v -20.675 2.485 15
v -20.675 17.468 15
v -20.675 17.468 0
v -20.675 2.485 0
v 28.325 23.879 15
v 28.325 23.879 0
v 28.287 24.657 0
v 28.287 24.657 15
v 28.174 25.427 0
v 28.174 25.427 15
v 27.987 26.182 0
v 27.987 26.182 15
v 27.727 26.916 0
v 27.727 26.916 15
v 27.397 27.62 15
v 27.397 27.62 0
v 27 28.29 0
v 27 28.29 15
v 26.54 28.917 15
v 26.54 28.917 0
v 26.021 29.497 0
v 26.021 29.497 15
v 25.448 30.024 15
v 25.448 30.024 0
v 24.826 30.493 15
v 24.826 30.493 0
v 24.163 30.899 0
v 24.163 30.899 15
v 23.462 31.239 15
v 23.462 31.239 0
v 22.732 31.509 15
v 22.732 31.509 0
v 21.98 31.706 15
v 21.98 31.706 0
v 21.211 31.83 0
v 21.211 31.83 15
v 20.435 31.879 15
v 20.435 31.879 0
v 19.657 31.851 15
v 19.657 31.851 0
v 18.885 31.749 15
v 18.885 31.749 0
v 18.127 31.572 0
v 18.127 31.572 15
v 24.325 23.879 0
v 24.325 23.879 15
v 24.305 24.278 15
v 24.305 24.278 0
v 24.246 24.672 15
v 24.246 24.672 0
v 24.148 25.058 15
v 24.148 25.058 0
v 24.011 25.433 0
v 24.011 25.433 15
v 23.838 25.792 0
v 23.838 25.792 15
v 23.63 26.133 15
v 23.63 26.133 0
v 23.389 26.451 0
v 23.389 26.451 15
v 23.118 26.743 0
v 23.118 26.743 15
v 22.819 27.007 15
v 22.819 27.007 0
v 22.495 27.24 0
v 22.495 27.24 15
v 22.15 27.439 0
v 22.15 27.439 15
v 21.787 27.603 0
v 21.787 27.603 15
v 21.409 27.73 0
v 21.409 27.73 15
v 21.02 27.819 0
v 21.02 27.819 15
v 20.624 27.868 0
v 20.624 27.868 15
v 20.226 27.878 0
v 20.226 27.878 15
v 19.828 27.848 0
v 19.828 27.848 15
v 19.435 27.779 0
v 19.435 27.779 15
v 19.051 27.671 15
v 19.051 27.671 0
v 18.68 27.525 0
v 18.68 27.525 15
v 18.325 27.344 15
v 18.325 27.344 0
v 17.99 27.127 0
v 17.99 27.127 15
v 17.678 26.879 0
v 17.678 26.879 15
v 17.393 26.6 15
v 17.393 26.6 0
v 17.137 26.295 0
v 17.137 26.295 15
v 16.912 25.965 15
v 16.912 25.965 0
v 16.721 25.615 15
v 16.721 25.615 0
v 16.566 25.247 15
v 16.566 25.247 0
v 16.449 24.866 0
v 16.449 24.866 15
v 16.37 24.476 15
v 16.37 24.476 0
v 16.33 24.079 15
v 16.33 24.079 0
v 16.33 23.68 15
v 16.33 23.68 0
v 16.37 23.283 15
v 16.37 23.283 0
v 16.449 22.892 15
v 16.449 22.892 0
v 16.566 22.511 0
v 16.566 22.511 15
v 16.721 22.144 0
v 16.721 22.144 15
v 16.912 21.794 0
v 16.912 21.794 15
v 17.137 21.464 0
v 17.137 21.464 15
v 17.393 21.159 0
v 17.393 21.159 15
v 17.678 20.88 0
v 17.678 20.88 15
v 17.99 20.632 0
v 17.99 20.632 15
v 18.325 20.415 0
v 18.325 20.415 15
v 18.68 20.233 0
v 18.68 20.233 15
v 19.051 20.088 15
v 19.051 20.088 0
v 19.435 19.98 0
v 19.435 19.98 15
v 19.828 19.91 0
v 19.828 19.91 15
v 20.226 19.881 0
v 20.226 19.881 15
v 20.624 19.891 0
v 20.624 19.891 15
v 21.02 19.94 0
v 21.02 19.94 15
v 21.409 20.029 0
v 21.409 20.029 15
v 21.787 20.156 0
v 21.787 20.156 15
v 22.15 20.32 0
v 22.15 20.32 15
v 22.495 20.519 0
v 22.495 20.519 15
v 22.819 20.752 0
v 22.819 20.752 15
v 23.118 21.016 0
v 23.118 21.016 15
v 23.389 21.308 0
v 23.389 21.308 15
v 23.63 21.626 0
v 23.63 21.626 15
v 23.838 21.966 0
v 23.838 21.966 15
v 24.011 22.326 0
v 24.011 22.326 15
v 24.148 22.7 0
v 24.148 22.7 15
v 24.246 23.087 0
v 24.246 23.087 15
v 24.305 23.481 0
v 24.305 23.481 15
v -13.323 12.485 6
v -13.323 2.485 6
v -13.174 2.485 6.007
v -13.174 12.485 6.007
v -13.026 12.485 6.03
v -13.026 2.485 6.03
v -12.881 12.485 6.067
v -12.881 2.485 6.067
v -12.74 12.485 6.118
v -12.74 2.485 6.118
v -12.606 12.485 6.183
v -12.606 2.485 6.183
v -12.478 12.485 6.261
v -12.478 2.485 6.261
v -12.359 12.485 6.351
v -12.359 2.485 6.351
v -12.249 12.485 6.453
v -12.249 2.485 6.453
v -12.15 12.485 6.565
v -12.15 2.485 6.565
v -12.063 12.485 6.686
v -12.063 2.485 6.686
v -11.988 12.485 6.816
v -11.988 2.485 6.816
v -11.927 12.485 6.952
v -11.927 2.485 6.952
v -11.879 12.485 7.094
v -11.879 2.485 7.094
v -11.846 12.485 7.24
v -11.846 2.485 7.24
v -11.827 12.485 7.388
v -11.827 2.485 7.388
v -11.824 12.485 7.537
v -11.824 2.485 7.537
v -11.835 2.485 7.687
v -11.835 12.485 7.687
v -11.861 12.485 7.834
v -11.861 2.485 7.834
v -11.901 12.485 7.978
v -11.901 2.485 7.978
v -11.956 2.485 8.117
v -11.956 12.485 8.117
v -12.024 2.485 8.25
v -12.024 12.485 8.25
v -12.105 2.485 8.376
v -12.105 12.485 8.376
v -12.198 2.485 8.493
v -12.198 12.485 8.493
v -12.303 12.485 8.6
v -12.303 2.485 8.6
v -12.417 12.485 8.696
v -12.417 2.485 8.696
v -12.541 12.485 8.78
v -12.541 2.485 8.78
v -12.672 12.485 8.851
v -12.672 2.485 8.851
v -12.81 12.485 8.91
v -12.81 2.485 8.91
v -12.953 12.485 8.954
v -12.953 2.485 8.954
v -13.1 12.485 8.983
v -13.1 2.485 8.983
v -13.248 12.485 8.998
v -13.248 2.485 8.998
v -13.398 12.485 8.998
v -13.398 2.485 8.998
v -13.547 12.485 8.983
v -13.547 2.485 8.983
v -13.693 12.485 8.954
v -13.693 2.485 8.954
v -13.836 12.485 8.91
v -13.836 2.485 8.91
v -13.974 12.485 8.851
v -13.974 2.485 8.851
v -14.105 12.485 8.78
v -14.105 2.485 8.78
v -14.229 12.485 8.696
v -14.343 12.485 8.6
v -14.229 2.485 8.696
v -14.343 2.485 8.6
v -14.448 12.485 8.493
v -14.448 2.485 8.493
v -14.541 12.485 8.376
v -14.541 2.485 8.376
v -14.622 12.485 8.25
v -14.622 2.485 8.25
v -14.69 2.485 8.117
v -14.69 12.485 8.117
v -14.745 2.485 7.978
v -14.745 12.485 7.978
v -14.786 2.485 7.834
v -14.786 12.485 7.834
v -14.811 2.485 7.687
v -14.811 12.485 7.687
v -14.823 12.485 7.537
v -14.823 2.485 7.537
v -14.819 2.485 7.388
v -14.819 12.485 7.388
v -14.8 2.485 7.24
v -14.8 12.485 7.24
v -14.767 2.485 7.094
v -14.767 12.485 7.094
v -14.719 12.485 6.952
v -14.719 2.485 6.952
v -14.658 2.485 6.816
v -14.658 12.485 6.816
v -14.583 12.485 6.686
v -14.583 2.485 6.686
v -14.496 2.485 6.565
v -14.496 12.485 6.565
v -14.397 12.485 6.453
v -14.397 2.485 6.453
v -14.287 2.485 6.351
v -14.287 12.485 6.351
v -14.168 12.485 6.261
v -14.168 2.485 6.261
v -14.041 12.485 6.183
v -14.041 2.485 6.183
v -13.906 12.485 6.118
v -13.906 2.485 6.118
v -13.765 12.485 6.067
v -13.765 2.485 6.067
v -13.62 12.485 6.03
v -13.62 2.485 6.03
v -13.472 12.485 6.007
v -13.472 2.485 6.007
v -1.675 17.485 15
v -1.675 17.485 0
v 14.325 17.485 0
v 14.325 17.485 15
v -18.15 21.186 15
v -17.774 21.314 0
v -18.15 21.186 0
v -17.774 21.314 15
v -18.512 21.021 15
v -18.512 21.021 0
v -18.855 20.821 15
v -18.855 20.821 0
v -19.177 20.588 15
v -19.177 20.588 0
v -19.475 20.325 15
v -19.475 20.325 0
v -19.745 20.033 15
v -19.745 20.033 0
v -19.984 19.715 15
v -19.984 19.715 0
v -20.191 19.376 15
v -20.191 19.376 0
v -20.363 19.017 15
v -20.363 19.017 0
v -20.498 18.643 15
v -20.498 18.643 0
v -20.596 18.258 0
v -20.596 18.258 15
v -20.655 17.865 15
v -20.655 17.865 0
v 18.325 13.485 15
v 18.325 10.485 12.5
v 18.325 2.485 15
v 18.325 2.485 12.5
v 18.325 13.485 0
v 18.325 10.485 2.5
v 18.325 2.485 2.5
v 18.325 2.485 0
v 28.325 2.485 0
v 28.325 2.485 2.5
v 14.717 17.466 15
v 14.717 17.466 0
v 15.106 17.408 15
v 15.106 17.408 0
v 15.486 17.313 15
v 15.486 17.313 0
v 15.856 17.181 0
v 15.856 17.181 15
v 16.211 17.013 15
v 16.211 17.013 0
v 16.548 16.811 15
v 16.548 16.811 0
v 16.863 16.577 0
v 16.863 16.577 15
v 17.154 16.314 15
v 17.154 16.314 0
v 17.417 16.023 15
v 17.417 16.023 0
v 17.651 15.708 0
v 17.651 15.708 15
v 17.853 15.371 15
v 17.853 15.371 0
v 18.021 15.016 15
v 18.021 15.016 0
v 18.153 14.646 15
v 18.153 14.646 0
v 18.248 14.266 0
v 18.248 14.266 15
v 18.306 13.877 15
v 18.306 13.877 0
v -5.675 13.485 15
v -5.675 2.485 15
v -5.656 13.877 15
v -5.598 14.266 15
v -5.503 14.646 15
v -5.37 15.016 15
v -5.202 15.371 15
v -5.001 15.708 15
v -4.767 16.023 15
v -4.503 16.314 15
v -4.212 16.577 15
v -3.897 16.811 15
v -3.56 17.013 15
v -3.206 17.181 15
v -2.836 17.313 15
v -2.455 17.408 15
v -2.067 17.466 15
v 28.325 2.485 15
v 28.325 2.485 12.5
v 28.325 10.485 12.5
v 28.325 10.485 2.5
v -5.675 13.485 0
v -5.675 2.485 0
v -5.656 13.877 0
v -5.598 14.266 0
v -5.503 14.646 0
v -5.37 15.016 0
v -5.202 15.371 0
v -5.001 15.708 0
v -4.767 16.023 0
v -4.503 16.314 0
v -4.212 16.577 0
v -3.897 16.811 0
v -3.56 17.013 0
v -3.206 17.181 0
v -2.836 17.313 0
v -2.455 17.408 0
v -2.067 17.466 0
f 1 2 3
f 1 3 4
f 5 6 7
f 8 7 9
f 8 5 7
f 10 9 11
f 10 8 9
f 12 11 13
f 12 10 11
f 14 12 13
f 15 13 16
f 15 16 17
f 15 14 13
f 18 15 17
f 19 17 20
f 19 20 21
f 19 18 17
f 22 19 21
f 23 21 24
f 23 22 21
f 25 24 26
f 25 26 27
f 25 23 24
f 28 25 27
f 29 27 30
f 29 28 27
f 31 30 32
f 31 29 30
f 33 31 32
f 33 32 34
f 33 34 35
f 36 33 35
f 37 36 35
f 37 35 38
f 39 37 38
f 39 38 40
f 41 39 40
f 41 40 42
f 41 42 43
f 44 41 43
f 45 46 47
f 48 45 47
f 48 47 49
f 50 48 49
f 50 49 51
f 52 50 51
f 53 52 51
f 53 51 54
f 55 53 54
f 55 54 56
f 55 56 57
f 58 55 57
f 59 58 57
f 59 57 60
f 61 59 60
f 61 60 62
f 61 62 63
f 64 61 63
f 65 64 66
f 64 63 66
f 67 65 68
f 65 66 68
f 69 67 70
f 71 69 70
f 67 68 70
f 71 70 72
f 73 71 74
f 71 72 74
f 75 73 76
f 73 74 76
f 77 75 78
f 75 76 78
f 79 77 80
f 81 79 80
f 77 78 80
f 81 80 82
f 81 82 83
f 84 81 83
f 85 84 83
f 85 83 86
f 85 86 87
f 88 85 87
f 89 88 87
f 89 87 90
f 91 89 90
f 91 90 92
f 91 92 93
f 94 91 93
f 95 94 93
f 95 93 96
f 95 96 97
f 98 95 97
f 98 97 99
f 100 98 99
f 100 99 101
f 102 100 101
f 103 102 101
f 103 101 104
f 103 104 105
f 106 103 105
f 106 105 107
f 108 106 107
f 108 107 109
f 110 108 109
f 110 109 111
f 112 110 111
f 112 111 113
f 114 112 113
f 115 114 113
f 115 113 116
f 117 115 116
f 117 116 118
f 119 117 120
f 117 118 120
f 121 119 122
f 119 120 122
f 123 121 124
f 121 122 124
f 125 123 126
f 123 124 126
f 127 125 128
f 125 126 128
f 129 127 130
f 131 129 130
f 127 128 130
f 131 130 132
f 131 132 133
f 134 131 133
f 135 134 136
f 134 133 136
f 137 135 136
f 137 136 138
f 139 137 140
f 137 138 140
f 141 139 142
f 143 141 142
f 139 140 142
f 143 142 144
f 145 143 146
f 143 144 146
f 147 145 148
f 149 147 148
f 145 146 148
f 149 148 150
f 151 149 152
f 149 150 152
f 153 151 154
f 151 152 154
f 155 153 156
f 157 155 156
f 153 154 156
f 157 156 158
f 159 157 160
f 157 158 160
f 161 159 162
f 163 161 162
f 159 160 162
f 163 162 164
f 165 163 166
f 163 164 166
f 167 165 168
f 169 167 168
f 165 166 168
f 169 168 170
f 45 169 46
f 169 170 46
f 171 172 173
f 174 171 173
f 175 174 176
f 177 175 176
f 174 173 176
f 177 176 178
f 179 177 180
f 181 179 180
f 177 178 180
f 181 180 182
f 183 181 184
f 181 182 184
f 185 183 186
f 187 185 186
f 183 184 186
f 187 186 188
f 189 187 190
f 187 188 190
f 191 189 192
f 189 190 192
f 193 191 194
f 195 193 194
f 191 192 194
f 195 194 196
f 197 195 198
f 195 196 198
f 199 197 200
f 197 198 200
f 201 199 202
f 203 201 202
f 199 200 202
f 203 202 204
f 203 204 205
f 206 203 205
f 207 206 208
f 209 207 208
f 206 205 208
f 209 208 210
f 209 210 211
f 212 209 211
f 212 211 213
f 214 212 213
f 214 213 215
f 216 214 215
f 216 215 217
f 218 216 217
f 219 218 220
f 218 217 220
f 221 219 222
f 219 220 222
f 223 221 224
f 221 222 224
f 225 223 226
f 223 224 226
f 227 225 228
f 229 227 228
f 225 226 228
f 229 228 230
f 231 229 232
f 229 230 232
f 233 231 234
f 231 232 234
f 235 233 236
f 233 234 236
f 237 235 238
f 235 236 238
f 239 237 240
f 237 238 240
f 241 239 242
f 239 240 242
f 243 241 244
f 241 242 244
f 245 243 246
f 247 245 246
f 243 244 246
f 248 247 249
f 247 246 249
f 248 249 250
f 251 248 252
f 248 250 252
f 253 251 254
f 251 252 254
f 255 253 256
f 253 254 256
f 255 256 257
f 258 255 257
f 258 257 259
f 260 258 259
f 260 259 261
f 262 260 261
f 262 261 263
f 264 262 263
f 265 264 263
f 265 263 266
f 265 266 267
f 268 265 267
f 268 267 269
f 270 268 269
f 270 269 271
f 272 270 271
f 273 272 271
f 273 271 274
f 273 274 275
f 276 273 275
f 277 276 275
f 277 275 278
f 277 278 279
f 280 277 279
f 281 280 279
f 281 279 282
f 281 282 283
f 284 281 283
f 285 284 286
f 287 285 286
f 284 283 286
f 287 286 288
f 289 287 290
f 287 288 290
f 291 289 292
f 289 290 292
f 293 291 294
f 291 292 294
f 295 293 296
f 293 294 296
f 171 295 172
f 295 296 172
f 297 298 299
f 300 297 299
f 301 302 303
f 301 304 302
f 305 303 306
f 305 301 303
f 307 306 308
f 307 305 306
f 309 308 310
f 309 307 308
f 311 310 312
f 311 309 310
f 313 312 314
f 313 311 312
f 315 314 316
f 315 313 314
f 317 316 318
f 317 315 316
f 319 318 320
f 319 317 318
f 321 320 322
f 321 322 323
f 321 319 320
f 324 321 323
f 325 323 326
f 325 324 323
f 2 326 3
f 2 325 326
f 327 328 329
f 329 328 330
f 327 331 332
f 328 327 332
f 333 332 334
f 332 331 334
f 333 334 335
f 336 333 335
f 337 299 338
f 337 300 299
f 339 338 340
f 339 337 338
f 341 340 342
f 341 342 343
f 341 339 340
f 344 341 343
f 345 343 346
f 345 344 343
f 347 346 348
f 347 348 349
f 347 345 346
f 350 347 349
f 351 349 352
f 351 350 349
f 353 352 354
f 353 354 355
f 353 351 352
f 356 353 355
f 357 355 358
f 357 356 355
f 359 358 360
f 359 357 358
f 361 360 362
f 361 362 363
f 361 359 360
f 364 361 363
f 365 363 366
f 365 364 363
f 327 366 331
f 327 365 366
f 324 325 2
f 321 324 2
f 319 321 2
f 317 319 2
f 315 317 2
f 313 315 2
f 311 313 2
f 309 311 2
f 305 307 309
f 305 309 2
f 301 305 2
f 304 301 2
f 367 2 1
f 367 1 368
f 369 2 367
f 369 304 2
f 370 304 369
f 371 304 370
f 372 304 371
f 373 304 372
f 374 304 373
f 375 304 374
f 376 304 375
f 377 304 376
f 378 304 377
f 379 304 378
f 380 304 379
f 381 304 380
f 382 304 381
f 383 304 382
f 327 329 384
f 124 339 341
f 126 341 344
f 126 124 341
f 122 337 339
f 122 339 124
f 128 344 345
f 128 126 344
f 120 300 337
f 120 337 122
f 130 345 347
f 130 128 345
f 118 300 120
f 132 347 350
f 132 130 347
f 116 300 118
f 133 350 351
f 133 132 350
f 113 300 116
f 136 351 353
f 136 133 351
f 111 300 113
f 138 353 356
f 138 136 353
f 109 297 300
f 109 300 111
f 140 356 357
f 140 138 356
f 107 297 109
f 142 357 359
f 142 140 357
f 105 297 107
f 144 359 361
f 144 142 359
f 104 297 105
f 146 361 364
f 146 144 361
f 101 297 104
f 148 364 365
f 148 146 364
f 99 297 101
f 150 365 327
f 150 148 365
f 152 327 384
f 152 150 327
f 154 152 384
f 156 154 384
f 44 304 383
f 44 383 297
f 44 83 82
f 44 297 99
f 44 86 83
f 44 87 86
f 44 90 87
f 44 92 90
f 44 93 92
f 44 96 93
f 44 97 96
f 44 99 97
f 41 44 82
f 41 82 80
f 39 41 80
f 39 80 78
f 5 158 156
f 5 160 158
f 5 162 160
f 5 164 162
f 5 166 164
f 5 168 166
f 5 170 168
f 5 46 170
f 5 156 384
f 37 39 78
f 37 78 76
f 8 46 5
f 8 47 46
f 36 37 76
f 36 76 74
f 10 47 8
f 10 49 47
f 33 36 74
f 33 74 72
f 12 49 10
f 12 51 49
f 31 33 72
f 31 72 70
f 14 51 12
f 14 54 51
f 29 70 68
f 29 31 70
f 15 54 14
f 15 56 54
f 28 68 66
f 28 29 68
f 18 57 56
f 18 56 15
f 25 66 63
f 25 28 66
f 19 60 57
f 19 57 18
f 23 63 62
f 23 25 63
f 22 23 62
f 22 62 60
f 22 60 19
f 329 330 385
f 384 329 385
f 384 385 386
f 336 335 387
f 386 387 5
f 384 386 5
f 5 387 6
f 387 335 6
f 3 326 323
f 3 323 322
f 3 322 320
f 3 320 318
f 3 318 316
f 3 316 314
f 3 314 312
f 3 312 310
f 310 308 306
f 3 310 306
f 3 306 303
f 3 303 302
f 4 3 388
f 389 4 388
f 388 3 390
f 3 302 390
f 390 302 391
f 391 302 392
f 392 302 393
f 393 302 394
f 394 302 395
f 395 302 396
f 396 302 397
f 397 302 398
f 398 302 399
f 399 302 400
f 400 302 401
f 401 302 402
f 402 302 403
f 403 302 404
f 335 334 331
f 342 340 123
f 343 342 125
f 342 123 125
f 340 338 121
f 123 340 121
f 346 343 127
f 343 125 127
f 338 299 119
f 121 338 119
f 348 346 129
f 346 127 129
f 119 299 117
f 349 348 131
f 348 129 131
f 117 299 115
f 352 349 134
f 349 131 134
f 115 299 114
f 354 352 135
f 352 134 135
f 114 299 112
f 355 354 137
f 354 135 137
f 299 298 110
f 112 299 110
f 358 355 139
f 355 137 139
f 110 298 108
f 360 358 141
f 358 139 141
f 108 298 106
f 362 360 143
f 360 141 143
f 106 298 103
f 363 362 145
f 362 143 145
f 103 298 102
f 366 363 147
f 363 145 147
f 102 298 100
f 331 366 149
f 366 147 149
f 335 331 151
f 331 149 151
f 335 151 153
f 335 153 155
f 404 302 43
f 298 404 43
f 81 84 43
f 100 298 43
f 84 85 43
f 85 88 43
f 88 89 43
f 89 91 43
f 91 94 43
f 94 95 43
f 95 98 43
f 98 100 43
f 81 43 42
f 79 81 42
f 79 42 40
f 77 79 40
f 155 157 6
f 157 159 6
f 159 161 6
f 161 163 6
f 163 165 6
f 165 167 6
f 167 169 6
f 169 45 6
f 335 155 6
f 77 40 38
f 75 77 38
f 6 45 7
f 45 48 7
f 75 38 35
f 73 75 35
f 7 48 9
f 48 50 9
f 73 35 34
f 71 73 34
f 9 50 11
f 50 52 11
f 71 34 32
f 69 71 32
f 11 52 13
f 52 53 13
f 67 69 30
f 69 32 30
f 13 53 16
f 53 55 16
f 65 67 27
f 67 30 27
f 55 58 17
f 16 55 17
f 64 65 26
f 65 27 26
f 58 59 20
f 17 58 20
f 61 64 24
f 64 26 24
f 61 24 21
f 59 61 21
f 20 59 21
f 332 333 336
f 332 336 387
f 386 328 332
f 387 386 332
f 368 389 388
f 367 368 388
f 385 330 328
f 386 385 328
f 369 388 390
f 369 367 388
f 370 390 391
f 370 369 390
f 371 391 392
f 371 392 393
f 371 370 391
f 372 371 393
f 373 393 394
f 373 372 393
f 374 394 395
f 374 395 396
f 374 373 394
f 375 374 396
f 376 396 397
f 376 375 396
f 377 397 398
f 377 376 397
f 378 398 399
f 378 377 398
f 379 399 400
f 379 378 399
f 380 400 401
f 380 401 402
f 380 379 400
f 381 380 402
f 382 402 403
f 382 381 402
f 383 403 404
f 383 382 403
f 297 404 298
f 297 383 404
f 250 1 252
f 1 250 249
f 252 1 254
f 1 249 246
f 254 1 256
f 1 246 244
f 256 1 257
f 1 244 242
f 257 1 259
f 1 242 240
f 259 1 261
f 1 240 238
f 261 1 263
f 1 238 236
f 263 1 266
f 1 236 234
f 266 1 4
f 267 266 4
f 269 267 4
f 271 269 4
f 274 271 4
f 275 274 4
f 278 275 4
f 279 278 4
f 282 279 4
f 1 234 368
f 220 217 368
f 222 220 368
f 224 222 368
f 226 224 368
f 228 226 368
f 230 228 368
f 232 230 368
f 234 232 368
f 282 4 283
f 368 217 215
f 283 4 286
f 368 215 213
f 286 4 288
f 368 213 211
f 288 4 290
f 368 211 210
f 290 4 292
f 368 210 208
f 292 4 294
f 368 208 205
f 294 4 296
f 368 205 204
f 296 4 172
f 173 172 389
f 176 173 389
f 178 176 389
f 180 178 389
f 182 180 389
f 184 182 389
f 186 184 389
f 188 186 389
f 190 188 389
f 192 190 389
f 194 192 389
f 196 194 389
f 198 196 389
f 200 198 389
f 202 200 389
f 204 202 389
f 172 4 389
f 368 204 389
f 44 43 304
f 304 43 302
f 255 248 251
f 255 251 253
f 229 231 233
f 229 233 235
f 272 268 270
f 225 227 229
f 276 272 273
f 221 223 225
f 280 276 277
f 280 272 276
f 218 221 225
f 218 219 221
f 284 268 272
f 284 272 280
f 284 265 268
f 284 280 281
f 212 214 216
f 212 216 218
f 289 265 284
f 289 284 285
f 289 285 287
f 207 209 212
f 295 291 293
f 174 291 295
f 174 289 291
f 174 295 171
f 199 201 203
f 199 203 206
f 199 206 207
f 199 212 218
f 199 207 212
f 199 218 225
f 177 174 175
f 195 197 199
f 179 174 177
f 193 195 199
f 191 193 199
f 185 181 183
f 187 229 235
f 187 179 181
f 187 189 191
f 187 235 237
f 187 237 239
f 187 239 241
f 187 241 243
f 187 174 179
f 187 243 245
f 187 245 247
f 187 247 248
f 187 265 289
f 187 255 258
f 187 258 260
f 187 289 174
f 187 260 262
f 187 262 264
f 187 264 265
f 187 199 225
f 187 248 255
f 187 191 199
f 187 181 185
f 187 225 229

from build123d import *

# Parameters (mm, degrees)
EXTRUDE_1_DEPTH          = 15
FILLET_1_R               = 8
FILLET_2_R               = 4
SKETCH_2_R               = 4
CUT_EXTRUDE_1_DEPTH      = 46.20636026
FILLET_3_R               = 4
FILLET_4_R               = 4
SKETCH_3_R               = 1.5
CUT_EXTRUDE_2_DEPTH      = 10
CUT_EXTRUDE_3_DEPTH      = 61.351439793
CUT_EXTRUDE_3_DEPTH_BACK = 20
SKETCH_4_W               = 10
SKETCH_4_H               = 8


with BuildPart() as part:
    # 草图1 → 凸台-拉伸1 (new body)
    with BuildSketch(Plane.XY):
        Polygon((-20.674768795, 2.485242081), (-5.674768795, 2.485242081), (-5.674768795, 17.485242081), (18.325231205, 17.485242081), (18.325231205, 2.485242081), (28.325231205, 2.485242081), (28.325231205, 34.485242081), (-20.674768795, 20.485242081), align=None)
    extrude(amount=EXTRUDE_1_DEPTH)

    # 圆角1
    fillet_1_edges = [part.edges().sort_by_distance(p)[0] for p in [
        (28.325231205, 34.485242081, 7.5),
    ]]
    fillet(fillet_1_edges, radius=FILLET_1_R)

    # 圆角2
    fillet_2_edges = [part.edges().sort_by_distance(p)[0] for p in [
        (-20.674768795, 20.485242081, 7.5),
    ]]
    fillet(fillet_2_edges, radius=FILLET_2_R)

    # 草图2 → 切除-拉伸1 (cut, through all)
    with BuildSketch(Plane.XY.offset(15)):
        with Locations((20.325231205, 23.879402207)):
            Circle(SKETCH_2_R)
    extrude(amount=-CUT_EXTRUDE_1_DEPTH, mode=Mode.SUBTRACT)

    # 圆角3
    fillet_3_edges = [part.edges().sort_by_distance(p)[0] for p in [
        (-5.674768795, 17.485242081, 7.5),
    ]]
    fillet(fillet_3_edges, radius=FILLET_3_R)

    # 圆角4
    fillet_4_edges = [part.edges().sort_by_distance(p)[0] for p in [
        (18.325231205, 17.485242081, 7.5),
    ]]
    fillet(fillet_4_edges, radius=FILLET_4_R)

    # 草图3 → 切除-拉伸2 (cut)
    with BuildSketch(Plane.XZ.offset(-2.485242081)):
        with Locations(Location((-13.323141104, 7.5, 0), (0, 0, 270))):
            Circle(SKETCH_3_R)
    extrude(amount=-CUT_EXTRUDE_2_DEPTH, mode=Mode.SUBTRACT)

    # 草图4 → 切除-拉伸3 (cut, two sides: drawn at the far end of the back side and taken through both)
    with BuildSketch(Plane(origin=(28.325231205, 0, 0), x_dir=(0, 0, -1), z_dir=(1, 0, 0)).offset(-CUT_EXTRUDE_3_DEPTH_BACK)):
        with Locations((-7.5, 6.485242081)):
            Rectangle(SKETCH_4_W, SKETCH_4_H)
    extrude(amount=CUT_EXTRUDE_3_DEPTH + CUT_EXTRUDE_3_DEPTH_BACK, mode=Mode.SUBTRACT)


solid = part.part
